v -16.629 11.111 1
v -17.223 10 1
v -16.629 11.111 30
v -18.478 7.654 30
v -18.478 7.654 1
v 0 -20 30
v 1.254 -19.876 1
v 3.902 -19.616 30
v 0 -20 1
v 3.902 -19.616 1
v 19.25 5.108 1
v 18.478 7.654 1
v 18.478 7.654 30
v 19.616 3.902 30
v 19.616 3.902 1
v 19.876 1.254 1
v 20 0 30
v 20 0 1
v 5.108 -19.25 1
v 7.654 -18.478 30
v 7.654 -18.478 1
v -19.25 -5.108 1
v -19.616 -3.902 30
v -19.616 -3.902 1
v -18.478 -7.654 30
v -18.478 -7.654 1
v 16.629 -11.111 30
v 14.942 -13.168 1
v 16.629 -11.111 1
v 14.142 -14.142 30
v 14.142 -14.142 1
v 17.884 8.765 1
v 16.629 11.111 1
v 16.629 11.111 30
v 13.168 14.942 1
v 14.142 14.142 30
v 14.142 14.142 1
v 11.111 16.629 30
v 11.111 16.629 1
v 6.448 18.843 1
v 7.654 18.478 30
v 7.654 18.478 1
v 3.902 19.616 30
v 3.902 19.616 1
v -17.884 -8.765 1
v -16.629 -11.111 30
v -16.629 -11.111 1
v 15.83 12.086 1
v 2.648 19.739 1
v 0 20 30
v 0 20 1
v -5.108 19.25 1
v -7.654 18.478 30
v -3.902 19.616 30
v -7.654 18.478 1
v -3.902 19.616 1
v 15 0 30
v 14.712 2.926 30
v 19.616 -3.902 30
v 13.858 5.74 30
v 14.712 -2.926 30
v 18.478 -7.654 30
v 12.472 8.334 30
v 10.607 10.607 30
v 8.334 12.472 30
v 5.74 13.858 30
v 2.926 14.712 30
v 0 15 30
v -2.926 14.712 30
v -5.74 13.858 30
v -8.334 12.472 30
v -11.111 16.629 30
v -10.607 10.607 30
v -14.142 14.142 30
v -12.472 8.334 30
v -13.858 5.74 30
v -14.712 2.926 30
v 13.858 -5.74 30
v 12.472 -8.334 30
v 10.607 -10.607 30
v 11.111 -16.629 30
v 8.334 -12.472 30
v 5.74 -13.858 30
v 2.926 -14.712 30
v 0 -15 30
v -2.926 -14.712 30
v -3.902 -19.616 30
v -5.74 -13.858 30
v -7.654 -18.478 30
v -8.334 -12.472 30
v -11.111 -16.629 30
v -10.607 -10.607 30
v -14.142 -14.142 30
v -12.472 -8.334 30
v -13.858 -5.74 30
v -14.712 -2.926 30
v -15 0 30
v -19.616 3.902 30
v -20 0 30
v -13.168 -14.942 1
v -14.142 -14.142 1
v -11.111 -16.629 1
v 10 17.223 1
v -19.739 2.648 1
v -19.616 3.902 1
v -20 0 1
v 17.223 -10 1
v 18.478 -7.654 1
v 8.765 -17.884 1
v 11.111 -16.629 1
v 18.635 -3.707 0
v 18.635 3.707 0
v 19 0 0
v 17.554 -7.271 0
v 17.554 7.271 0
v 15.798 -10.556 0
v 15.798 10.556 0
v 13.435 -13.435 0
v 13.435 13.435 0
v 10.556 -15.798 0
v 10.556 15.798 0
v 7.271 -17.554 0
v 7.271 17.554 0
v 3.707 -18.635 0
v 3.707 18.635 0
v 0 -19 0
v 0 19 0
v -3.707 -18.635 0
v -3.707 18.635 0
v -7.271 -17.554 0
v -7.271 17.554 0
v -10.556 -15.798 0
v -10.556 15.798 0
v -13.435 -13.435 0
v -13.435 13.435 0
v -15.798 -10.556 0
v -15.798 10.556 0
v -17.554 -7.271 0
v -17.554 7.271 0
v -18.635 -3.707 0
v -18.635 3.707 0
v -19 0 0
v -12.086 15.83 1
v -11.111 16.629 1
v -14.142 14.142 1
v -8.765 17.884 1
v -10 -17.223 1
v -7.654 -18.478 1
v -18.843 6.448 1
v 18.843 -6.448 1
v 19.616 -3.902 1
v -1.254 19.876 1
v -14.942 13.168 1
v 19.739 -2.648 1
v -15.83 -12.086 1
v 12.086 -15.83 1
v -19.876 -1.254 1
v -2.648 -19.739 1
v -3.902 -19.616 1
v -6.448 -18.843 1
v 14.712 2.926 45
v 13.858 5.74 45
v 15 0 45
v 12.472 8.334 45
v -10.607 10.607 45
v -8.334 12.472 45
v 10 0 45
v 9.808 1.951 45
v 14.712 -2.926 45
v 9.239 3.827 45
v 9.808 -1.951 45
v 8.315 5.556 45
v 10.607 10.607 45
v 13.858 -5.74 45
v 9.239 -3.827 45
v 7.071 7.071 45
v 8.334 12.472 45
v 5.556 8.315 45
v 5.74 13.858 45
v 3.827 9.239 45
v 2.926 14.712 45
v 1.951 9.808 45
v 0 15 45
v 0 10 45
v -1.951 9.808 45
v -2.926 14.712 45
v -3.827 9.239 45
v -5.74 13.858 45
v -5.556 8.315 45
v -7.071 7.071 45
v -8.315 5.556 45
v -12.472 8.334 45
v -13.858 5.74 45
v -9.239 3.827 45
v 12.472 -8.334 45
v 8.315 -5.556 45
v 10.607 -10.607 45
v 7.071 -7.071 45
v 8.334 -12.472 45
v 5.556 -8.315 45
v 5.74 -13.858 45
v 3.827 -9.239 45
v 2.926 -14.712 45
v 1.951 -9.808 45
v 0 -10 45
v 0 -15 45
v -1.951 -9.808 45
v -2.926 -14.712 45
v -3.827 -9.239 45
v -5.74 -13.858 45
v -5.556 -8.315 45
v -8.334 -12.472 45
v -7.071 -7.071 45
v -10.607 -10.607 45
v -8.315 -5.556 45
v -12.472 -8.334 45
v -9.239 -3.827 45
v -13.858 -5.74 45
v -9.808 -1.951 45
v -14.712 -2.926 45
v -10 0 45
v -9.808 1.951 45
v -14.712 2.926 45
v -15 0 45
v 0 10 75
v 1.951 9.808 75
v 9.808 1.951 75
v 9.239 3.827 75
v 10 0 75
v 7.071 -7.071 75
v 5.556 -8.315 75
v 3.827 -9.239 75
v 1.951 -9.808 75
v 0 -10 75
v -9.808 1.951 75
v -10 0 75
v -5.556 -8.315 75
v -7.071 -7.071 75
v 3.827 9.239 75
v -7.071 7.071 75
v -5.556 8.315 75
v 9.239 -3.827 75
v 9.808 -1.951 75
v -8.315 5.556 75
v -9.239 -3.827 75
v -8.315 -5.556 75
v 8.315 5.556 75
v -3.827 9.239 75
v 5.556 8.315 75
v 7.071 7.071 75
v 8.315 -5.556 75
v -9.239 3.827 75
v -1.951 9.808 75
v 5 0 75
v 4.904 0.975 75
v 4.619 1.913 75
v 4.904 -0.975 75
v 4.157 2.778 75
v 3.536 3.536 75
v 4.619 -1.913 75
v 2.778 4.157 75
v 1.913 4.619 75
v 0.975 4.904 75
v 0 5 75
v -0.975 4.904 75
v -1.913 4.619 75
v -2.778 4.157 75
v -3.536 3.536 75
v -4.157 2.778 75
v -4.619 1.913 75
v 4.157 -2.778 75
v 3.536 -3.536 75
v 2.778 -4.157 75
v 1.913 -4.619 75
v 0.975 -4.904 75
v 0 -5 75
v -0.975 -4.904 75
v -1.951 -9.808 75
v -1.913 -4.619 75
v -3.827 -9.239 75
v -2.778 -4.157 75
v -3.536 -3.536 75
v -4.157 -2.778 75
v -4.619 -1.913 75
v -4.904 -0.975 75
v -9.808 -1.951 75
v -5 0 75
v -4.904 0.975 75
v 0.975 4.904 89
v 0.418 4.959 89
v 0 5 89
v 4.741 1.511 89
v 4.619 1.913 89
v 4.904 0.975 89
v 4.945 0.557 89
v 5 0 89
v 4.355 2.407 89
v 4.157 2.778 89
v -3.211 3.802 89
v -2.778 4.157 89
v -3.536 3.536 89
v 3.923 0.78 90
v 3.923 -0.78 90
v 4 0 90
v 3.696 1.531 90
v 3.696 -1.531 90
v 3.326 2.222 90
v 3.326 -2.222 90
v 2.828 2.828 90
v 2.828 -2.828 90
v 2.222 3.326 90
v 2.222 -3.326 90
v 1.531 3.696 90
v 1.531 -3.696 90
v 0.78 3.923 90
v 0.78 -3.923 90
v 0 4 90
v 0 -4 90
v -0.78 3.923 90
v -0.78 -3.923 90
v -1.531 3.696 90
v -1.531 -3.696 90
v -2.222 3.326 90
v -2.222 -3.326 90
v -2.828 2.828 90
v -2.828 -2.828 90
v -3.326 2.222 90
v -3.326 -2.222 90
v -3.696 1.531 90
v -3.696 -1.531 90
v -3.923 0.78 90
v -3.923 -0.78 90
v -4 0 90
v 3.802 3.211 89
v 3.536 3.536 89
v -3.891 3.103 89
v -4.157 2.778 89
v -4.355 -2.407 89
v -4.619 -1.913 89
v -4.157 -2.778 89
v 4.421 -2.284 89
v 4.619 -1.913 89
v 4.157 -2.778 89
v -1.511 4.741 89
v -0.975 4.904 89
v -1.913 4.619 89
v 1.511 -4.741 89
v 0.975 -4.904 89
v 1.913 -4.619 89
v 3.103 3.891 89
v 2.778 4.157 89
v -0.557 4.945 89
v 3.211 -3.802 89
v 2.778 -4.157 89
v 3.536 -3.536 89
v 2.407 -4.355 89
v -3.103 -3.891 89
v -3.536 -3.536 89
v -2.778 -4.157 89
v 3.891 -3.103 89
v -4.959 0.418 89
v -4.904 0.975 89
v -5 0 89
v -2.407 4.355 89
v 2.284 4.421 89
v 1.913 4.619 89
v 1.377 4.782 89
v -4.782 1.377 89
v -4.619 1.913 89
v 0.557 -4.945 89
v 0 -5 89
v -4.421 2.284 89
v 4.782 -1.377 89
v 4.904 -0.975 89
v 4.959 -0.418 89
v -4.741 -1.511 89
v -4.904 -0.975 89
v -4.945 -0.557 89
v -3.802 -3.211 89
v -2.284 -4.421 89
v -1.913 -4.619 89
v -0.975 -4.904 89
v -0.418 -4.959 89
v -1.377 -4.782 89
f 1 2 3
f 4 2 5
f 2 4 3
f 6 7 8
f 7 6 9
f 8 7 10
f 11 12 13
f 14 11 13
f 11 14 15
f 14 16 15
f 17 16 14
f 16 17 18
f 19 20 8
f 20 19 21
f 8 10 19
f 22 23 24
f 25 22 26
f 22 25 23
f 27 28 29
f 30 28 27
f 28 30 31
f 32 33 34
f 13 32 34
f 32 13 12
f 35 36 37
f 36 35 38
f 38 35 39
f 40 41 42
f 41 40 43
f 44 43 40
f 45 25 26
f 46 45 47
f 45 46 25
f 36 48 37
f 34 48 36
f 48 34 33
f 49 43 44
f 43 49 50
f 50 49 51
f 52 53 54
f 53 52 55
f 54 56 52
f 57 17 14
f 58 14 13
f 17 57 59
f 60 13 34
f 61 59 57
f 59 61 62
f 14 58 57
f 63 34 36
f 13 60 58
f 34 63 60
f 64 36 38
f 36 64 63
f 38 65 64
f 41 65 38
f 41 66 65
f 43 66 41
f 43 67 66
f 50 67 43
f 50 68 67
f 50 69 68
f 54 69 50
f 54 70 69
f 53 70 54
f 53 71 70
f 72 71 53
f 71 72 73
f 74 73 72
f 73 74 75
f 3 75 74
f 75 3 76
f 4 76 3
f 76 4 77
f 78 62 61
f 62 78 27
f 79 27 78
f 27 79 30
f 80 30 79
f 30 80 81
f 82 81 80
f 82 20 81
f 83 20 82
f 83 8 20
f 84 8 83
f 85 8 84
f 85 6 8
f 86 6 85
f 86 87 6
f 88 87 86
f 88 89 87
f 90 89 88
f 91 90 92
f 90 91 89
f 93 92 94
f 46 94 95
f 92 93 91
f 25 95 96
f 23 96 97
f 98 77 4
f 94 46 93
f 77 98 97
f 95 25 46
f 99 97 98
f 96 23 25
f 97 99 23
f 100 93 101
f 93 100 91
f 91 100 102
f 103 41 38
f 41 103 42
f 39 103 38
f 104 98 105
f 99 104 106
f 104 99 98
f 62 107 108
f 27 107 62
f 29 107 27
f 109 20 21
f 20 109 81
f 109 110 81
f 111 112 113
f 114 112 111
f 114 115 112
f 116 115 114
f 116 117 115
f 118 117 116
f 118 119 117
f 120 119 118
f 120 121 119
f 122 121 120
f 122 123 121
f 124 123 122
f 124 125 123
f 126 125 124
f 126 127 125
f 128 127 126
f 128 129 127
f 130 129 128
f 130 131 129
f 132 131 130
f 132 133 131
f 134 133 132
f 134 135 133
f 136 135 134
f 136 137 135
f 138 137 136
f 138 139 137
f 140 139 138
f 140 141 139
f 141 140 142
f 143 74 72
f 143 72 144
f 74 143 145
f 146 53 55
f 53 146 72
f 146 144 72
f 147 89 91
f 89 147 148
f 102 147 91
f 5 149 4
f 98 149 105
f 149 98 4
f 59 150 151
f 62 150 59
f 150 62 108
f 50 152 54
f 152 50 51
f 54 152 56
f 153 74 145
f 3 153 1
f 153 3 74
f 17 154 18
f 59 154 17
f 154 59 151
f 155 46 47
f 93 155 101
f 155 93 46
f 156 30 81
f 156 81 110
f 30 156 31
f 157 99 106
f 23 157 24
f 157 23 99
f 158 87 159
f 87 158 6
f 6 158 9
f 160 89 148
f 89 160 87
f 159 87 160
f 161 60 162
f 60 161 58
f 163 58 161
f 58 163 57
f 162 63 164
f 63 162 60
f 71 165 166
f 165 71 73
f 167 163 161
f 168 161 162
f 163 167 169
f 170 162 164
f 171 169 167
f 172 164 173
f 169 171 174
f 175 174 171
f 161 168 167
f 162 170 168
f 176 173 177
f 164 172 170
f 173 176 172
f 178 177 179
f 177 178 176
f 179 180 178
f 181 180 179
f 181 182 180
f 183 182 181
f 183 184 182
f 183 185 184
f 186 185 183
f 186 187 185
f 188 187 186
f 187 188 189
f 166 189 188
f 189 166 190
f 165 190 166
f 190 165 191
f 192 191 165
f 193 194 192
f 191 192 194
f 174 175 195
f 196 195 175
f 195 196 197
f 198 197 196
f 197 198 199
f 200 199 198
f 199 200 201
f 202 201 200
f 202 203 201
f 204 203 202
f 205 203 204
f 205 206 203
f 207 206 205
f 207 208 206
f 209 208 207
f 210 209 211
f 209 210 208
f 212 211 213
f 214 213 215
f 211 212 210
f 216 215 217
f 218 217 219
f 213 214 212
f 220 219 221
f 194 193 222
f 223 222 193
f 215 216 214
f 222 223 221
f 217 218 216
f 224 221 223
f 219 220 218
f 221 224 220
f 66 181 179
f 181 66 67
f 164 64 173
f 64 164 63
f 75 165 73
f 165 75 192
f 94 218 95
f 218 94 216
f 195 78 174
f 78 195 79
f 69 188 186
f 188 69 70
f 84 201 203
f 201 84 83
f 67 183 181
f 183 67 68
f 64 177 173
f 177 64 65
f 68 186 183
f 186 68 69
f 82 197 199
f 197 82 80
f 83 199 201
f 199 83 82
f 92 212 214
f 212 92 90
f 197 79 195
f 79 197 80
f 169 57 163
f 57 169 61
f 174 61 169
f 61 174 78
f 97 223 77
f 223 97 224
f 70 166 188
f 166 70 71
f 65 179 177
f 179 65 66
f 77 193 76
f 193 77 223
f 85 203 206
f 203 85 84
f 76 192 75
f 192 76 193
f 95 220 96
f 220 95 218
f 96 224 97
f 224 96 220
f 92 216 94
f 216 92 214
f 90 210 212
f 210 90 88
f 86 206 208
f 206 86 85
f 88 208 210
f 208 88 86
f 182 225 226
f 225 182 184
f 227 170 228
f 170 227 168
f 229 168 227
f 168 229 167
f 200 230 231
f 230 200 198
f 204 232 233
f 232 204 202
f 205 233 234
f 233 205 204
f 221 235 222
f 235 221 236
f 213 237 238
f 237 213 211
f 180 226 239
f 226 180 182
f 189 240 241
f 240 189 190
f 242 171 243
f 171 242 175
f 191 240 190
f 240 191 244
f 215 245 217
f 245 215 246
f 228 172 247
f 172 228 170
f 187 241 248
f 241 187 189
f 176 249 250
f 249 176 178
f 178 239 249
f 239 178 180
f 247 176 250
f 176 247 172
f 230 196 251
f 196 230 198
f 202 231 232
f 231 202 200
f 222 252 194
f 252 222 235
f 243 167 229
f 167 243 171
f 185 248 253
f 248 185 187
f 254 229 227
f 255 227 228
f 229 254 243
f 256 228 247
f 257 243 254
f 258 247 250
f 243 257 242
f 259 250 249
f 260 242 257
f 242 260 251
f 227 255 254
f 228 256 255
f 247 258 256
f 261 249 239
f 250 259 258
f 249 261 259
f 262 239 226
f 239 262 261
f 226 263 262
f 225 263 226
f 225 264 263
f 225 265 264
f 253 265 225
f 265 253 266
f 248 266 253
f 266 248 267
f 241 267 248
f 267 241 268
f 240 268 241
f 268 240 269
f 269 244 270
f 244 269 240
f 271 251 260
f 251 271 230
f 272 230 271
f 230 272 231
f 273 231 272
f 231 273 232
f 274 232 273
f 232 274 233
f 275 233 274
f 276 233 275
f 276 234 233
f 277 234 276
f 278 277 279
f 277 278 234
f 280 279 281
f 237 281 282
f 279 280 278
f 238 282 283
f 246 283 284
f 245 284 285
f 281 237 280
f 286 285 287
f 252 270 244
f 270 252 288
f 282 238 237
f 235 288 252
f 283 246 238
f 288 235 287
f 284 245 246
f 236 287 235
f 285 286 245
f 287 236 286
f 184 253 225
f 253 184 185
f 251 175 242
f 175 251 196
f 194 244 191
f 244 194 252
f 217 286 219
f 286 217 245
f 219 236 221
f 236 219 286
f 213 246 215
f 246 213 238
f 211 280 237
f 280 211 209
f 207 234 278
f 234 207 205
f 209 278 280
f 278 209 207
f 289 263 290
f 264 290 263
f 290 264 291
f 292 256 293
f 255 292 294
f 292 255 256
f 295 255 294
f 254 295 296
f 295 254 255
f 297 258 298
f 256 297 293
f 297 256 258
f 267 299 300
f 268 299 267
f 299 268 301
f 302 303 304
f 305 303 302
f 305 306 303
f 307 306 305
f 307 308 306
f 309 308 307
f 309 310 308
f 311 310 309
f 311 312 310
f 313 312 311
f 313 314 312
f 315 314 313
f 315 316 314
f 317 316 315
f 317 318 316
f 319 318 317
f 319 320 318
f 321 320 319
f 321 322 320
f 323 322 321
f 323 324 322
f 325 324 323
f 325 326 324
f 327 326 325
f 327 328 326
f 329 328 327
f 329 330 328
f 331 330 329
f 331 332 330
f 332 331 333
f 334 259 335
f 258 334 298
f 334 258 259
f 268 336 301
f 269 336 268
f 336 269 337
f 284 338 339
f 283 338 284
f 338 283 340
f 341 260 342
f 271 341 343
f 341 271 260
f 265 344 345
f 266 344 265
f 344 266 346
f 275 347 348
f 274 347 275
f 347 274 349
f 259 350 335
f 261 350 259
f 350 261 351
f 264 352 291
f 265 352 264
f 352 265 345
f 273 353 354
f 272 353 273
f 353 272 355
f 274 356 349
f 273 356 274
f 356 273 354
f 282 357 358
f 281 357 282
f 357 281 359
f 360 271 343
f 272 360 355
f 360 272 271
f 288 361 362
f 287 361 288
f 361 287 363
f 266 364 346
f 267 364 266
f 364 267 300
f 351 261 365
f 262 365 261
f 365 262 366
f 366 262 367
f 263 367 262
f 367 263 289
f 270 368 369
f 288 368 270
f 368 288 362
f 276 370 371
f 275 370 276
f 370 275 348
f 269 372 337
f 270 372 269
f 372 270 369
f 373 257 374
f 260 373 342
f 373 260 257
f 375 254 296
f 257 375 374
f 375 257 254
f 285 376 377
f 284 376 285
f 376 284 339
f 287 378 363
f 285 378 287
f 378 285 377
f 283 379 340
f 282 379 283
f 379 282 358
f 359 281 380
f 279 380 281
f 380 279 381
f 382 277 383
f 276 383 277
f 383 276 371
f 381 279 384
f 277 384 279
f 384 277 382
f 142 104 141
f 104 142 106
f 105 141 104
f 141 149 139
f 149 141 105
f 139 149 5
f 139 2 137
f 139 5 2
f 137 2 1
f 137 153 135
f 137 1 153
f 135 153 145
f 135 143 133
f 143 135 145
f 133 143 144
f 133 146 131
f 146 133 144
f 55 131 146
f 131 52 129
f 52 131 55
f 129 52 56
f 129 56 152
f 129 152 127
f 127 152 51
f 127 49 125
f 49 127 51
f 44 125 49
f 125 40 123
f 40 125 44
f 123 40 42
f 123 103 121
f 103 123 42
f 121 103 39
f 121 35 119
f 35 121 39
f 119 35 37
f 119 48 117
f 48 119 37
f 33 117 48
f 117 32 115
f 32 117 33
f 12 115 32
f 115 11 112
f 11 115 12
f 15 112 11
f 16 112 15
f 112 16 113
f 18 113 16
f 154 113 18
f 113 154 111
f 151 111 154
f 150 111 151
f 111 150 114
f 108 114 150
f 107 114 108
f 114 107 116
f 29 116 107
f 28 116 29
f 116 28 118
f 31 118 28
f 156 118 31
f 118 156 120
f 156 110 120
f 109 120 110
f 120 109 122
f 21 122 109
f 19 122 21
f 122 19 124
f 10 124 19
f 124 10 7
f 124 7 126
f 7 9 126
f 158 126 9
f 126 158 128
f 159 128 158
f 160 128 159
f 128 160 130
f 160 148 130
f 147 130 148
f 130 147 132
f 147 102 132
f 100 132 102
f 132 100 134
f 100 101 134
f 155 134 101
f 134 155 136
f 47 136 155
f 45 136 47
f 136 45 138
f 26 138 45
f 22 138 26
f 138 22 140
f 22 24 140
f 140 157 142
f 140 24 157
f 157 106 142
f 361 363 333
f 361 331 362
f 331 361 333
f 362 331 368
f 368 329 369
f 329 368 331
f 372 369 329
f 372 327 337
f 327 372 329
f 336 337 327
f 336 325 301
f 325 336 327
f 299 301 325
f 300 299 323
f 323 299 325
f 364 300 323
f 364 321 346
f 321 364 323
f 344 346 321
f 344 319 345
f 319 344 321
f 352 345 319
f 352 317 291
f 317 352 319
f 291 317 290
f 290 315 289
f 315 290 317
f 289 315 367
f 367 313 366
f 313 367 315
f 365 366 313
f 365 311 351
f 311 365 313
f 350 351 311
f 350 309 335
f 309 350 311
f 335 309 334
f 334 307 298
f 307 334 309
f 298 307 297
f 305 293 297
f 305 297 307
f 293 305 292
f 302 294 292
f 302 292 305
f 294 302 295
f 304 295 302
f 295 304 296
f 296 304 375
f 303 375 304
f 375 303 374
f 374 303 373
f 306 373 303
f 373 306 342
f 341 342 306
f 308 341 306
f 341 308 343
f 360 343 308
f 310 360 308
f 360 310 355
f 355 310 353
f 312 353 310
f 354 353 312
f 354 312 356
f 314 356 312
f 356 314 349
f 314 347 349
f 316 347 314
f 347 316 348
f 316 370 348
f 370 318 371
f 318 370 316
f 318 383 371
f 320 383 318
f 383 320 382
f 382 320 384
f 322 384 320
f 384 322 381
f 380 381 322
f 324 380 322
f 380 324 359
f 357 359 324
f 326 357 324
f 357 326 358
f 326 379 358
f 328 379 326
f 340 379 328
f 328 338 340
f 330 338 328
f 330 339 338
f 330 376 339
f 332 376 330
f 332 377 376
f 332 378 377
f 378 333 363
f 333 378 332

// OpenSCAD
$fn = 32;

// ----------------------------------------------------------------------
// Stepped shaft: diameters 40, 30, 20, 10 mm, 90 mm long
// ----------------------------------------------------------------------

// --- parameters (mm) ---
d1 = 40;                  // step 1 diameter
len1 = 30;                // step 1 length
d2 = 30;                  // step 2 diameter
len2 = 15;                // step 2 length
d3 = 20;                  // step 3 diameter
len3 = 30;                // step 3 length
d4 = 10;                  // step 4 diameter
len4 = 15;                // step 4 length
total = 90;               // overall length
chamfer = 1;              // end chamfer

difference() {
  /* turned body: stacked cylinders, every step sunk into the bigger one */
  union() {
    cylinder(h = len1, d = d1);
    translate([0, 0, 29.6]) cylinder(h = 15.4, d = d2);
    translate([0, 0, 44.6]) cylinder(h = 30.4, d = d3);
    translate([0, 0, 74.6]) cylinder(h = 15.4, d = d4);
  }
  /* bottom chamfer ring cut */
  rotate_extrude() translate([19, -2.5]) polygon([[0, 0], [3.5, 0], [3.5, 6], [0, 2.5]]);
  /* top chamfer ring cut */
  rotate_extrude() translate([4, 90]) polygon([[0, 0], [3.5, -3.5], [3.5, 2.5], [0, 2.5]]);
}
